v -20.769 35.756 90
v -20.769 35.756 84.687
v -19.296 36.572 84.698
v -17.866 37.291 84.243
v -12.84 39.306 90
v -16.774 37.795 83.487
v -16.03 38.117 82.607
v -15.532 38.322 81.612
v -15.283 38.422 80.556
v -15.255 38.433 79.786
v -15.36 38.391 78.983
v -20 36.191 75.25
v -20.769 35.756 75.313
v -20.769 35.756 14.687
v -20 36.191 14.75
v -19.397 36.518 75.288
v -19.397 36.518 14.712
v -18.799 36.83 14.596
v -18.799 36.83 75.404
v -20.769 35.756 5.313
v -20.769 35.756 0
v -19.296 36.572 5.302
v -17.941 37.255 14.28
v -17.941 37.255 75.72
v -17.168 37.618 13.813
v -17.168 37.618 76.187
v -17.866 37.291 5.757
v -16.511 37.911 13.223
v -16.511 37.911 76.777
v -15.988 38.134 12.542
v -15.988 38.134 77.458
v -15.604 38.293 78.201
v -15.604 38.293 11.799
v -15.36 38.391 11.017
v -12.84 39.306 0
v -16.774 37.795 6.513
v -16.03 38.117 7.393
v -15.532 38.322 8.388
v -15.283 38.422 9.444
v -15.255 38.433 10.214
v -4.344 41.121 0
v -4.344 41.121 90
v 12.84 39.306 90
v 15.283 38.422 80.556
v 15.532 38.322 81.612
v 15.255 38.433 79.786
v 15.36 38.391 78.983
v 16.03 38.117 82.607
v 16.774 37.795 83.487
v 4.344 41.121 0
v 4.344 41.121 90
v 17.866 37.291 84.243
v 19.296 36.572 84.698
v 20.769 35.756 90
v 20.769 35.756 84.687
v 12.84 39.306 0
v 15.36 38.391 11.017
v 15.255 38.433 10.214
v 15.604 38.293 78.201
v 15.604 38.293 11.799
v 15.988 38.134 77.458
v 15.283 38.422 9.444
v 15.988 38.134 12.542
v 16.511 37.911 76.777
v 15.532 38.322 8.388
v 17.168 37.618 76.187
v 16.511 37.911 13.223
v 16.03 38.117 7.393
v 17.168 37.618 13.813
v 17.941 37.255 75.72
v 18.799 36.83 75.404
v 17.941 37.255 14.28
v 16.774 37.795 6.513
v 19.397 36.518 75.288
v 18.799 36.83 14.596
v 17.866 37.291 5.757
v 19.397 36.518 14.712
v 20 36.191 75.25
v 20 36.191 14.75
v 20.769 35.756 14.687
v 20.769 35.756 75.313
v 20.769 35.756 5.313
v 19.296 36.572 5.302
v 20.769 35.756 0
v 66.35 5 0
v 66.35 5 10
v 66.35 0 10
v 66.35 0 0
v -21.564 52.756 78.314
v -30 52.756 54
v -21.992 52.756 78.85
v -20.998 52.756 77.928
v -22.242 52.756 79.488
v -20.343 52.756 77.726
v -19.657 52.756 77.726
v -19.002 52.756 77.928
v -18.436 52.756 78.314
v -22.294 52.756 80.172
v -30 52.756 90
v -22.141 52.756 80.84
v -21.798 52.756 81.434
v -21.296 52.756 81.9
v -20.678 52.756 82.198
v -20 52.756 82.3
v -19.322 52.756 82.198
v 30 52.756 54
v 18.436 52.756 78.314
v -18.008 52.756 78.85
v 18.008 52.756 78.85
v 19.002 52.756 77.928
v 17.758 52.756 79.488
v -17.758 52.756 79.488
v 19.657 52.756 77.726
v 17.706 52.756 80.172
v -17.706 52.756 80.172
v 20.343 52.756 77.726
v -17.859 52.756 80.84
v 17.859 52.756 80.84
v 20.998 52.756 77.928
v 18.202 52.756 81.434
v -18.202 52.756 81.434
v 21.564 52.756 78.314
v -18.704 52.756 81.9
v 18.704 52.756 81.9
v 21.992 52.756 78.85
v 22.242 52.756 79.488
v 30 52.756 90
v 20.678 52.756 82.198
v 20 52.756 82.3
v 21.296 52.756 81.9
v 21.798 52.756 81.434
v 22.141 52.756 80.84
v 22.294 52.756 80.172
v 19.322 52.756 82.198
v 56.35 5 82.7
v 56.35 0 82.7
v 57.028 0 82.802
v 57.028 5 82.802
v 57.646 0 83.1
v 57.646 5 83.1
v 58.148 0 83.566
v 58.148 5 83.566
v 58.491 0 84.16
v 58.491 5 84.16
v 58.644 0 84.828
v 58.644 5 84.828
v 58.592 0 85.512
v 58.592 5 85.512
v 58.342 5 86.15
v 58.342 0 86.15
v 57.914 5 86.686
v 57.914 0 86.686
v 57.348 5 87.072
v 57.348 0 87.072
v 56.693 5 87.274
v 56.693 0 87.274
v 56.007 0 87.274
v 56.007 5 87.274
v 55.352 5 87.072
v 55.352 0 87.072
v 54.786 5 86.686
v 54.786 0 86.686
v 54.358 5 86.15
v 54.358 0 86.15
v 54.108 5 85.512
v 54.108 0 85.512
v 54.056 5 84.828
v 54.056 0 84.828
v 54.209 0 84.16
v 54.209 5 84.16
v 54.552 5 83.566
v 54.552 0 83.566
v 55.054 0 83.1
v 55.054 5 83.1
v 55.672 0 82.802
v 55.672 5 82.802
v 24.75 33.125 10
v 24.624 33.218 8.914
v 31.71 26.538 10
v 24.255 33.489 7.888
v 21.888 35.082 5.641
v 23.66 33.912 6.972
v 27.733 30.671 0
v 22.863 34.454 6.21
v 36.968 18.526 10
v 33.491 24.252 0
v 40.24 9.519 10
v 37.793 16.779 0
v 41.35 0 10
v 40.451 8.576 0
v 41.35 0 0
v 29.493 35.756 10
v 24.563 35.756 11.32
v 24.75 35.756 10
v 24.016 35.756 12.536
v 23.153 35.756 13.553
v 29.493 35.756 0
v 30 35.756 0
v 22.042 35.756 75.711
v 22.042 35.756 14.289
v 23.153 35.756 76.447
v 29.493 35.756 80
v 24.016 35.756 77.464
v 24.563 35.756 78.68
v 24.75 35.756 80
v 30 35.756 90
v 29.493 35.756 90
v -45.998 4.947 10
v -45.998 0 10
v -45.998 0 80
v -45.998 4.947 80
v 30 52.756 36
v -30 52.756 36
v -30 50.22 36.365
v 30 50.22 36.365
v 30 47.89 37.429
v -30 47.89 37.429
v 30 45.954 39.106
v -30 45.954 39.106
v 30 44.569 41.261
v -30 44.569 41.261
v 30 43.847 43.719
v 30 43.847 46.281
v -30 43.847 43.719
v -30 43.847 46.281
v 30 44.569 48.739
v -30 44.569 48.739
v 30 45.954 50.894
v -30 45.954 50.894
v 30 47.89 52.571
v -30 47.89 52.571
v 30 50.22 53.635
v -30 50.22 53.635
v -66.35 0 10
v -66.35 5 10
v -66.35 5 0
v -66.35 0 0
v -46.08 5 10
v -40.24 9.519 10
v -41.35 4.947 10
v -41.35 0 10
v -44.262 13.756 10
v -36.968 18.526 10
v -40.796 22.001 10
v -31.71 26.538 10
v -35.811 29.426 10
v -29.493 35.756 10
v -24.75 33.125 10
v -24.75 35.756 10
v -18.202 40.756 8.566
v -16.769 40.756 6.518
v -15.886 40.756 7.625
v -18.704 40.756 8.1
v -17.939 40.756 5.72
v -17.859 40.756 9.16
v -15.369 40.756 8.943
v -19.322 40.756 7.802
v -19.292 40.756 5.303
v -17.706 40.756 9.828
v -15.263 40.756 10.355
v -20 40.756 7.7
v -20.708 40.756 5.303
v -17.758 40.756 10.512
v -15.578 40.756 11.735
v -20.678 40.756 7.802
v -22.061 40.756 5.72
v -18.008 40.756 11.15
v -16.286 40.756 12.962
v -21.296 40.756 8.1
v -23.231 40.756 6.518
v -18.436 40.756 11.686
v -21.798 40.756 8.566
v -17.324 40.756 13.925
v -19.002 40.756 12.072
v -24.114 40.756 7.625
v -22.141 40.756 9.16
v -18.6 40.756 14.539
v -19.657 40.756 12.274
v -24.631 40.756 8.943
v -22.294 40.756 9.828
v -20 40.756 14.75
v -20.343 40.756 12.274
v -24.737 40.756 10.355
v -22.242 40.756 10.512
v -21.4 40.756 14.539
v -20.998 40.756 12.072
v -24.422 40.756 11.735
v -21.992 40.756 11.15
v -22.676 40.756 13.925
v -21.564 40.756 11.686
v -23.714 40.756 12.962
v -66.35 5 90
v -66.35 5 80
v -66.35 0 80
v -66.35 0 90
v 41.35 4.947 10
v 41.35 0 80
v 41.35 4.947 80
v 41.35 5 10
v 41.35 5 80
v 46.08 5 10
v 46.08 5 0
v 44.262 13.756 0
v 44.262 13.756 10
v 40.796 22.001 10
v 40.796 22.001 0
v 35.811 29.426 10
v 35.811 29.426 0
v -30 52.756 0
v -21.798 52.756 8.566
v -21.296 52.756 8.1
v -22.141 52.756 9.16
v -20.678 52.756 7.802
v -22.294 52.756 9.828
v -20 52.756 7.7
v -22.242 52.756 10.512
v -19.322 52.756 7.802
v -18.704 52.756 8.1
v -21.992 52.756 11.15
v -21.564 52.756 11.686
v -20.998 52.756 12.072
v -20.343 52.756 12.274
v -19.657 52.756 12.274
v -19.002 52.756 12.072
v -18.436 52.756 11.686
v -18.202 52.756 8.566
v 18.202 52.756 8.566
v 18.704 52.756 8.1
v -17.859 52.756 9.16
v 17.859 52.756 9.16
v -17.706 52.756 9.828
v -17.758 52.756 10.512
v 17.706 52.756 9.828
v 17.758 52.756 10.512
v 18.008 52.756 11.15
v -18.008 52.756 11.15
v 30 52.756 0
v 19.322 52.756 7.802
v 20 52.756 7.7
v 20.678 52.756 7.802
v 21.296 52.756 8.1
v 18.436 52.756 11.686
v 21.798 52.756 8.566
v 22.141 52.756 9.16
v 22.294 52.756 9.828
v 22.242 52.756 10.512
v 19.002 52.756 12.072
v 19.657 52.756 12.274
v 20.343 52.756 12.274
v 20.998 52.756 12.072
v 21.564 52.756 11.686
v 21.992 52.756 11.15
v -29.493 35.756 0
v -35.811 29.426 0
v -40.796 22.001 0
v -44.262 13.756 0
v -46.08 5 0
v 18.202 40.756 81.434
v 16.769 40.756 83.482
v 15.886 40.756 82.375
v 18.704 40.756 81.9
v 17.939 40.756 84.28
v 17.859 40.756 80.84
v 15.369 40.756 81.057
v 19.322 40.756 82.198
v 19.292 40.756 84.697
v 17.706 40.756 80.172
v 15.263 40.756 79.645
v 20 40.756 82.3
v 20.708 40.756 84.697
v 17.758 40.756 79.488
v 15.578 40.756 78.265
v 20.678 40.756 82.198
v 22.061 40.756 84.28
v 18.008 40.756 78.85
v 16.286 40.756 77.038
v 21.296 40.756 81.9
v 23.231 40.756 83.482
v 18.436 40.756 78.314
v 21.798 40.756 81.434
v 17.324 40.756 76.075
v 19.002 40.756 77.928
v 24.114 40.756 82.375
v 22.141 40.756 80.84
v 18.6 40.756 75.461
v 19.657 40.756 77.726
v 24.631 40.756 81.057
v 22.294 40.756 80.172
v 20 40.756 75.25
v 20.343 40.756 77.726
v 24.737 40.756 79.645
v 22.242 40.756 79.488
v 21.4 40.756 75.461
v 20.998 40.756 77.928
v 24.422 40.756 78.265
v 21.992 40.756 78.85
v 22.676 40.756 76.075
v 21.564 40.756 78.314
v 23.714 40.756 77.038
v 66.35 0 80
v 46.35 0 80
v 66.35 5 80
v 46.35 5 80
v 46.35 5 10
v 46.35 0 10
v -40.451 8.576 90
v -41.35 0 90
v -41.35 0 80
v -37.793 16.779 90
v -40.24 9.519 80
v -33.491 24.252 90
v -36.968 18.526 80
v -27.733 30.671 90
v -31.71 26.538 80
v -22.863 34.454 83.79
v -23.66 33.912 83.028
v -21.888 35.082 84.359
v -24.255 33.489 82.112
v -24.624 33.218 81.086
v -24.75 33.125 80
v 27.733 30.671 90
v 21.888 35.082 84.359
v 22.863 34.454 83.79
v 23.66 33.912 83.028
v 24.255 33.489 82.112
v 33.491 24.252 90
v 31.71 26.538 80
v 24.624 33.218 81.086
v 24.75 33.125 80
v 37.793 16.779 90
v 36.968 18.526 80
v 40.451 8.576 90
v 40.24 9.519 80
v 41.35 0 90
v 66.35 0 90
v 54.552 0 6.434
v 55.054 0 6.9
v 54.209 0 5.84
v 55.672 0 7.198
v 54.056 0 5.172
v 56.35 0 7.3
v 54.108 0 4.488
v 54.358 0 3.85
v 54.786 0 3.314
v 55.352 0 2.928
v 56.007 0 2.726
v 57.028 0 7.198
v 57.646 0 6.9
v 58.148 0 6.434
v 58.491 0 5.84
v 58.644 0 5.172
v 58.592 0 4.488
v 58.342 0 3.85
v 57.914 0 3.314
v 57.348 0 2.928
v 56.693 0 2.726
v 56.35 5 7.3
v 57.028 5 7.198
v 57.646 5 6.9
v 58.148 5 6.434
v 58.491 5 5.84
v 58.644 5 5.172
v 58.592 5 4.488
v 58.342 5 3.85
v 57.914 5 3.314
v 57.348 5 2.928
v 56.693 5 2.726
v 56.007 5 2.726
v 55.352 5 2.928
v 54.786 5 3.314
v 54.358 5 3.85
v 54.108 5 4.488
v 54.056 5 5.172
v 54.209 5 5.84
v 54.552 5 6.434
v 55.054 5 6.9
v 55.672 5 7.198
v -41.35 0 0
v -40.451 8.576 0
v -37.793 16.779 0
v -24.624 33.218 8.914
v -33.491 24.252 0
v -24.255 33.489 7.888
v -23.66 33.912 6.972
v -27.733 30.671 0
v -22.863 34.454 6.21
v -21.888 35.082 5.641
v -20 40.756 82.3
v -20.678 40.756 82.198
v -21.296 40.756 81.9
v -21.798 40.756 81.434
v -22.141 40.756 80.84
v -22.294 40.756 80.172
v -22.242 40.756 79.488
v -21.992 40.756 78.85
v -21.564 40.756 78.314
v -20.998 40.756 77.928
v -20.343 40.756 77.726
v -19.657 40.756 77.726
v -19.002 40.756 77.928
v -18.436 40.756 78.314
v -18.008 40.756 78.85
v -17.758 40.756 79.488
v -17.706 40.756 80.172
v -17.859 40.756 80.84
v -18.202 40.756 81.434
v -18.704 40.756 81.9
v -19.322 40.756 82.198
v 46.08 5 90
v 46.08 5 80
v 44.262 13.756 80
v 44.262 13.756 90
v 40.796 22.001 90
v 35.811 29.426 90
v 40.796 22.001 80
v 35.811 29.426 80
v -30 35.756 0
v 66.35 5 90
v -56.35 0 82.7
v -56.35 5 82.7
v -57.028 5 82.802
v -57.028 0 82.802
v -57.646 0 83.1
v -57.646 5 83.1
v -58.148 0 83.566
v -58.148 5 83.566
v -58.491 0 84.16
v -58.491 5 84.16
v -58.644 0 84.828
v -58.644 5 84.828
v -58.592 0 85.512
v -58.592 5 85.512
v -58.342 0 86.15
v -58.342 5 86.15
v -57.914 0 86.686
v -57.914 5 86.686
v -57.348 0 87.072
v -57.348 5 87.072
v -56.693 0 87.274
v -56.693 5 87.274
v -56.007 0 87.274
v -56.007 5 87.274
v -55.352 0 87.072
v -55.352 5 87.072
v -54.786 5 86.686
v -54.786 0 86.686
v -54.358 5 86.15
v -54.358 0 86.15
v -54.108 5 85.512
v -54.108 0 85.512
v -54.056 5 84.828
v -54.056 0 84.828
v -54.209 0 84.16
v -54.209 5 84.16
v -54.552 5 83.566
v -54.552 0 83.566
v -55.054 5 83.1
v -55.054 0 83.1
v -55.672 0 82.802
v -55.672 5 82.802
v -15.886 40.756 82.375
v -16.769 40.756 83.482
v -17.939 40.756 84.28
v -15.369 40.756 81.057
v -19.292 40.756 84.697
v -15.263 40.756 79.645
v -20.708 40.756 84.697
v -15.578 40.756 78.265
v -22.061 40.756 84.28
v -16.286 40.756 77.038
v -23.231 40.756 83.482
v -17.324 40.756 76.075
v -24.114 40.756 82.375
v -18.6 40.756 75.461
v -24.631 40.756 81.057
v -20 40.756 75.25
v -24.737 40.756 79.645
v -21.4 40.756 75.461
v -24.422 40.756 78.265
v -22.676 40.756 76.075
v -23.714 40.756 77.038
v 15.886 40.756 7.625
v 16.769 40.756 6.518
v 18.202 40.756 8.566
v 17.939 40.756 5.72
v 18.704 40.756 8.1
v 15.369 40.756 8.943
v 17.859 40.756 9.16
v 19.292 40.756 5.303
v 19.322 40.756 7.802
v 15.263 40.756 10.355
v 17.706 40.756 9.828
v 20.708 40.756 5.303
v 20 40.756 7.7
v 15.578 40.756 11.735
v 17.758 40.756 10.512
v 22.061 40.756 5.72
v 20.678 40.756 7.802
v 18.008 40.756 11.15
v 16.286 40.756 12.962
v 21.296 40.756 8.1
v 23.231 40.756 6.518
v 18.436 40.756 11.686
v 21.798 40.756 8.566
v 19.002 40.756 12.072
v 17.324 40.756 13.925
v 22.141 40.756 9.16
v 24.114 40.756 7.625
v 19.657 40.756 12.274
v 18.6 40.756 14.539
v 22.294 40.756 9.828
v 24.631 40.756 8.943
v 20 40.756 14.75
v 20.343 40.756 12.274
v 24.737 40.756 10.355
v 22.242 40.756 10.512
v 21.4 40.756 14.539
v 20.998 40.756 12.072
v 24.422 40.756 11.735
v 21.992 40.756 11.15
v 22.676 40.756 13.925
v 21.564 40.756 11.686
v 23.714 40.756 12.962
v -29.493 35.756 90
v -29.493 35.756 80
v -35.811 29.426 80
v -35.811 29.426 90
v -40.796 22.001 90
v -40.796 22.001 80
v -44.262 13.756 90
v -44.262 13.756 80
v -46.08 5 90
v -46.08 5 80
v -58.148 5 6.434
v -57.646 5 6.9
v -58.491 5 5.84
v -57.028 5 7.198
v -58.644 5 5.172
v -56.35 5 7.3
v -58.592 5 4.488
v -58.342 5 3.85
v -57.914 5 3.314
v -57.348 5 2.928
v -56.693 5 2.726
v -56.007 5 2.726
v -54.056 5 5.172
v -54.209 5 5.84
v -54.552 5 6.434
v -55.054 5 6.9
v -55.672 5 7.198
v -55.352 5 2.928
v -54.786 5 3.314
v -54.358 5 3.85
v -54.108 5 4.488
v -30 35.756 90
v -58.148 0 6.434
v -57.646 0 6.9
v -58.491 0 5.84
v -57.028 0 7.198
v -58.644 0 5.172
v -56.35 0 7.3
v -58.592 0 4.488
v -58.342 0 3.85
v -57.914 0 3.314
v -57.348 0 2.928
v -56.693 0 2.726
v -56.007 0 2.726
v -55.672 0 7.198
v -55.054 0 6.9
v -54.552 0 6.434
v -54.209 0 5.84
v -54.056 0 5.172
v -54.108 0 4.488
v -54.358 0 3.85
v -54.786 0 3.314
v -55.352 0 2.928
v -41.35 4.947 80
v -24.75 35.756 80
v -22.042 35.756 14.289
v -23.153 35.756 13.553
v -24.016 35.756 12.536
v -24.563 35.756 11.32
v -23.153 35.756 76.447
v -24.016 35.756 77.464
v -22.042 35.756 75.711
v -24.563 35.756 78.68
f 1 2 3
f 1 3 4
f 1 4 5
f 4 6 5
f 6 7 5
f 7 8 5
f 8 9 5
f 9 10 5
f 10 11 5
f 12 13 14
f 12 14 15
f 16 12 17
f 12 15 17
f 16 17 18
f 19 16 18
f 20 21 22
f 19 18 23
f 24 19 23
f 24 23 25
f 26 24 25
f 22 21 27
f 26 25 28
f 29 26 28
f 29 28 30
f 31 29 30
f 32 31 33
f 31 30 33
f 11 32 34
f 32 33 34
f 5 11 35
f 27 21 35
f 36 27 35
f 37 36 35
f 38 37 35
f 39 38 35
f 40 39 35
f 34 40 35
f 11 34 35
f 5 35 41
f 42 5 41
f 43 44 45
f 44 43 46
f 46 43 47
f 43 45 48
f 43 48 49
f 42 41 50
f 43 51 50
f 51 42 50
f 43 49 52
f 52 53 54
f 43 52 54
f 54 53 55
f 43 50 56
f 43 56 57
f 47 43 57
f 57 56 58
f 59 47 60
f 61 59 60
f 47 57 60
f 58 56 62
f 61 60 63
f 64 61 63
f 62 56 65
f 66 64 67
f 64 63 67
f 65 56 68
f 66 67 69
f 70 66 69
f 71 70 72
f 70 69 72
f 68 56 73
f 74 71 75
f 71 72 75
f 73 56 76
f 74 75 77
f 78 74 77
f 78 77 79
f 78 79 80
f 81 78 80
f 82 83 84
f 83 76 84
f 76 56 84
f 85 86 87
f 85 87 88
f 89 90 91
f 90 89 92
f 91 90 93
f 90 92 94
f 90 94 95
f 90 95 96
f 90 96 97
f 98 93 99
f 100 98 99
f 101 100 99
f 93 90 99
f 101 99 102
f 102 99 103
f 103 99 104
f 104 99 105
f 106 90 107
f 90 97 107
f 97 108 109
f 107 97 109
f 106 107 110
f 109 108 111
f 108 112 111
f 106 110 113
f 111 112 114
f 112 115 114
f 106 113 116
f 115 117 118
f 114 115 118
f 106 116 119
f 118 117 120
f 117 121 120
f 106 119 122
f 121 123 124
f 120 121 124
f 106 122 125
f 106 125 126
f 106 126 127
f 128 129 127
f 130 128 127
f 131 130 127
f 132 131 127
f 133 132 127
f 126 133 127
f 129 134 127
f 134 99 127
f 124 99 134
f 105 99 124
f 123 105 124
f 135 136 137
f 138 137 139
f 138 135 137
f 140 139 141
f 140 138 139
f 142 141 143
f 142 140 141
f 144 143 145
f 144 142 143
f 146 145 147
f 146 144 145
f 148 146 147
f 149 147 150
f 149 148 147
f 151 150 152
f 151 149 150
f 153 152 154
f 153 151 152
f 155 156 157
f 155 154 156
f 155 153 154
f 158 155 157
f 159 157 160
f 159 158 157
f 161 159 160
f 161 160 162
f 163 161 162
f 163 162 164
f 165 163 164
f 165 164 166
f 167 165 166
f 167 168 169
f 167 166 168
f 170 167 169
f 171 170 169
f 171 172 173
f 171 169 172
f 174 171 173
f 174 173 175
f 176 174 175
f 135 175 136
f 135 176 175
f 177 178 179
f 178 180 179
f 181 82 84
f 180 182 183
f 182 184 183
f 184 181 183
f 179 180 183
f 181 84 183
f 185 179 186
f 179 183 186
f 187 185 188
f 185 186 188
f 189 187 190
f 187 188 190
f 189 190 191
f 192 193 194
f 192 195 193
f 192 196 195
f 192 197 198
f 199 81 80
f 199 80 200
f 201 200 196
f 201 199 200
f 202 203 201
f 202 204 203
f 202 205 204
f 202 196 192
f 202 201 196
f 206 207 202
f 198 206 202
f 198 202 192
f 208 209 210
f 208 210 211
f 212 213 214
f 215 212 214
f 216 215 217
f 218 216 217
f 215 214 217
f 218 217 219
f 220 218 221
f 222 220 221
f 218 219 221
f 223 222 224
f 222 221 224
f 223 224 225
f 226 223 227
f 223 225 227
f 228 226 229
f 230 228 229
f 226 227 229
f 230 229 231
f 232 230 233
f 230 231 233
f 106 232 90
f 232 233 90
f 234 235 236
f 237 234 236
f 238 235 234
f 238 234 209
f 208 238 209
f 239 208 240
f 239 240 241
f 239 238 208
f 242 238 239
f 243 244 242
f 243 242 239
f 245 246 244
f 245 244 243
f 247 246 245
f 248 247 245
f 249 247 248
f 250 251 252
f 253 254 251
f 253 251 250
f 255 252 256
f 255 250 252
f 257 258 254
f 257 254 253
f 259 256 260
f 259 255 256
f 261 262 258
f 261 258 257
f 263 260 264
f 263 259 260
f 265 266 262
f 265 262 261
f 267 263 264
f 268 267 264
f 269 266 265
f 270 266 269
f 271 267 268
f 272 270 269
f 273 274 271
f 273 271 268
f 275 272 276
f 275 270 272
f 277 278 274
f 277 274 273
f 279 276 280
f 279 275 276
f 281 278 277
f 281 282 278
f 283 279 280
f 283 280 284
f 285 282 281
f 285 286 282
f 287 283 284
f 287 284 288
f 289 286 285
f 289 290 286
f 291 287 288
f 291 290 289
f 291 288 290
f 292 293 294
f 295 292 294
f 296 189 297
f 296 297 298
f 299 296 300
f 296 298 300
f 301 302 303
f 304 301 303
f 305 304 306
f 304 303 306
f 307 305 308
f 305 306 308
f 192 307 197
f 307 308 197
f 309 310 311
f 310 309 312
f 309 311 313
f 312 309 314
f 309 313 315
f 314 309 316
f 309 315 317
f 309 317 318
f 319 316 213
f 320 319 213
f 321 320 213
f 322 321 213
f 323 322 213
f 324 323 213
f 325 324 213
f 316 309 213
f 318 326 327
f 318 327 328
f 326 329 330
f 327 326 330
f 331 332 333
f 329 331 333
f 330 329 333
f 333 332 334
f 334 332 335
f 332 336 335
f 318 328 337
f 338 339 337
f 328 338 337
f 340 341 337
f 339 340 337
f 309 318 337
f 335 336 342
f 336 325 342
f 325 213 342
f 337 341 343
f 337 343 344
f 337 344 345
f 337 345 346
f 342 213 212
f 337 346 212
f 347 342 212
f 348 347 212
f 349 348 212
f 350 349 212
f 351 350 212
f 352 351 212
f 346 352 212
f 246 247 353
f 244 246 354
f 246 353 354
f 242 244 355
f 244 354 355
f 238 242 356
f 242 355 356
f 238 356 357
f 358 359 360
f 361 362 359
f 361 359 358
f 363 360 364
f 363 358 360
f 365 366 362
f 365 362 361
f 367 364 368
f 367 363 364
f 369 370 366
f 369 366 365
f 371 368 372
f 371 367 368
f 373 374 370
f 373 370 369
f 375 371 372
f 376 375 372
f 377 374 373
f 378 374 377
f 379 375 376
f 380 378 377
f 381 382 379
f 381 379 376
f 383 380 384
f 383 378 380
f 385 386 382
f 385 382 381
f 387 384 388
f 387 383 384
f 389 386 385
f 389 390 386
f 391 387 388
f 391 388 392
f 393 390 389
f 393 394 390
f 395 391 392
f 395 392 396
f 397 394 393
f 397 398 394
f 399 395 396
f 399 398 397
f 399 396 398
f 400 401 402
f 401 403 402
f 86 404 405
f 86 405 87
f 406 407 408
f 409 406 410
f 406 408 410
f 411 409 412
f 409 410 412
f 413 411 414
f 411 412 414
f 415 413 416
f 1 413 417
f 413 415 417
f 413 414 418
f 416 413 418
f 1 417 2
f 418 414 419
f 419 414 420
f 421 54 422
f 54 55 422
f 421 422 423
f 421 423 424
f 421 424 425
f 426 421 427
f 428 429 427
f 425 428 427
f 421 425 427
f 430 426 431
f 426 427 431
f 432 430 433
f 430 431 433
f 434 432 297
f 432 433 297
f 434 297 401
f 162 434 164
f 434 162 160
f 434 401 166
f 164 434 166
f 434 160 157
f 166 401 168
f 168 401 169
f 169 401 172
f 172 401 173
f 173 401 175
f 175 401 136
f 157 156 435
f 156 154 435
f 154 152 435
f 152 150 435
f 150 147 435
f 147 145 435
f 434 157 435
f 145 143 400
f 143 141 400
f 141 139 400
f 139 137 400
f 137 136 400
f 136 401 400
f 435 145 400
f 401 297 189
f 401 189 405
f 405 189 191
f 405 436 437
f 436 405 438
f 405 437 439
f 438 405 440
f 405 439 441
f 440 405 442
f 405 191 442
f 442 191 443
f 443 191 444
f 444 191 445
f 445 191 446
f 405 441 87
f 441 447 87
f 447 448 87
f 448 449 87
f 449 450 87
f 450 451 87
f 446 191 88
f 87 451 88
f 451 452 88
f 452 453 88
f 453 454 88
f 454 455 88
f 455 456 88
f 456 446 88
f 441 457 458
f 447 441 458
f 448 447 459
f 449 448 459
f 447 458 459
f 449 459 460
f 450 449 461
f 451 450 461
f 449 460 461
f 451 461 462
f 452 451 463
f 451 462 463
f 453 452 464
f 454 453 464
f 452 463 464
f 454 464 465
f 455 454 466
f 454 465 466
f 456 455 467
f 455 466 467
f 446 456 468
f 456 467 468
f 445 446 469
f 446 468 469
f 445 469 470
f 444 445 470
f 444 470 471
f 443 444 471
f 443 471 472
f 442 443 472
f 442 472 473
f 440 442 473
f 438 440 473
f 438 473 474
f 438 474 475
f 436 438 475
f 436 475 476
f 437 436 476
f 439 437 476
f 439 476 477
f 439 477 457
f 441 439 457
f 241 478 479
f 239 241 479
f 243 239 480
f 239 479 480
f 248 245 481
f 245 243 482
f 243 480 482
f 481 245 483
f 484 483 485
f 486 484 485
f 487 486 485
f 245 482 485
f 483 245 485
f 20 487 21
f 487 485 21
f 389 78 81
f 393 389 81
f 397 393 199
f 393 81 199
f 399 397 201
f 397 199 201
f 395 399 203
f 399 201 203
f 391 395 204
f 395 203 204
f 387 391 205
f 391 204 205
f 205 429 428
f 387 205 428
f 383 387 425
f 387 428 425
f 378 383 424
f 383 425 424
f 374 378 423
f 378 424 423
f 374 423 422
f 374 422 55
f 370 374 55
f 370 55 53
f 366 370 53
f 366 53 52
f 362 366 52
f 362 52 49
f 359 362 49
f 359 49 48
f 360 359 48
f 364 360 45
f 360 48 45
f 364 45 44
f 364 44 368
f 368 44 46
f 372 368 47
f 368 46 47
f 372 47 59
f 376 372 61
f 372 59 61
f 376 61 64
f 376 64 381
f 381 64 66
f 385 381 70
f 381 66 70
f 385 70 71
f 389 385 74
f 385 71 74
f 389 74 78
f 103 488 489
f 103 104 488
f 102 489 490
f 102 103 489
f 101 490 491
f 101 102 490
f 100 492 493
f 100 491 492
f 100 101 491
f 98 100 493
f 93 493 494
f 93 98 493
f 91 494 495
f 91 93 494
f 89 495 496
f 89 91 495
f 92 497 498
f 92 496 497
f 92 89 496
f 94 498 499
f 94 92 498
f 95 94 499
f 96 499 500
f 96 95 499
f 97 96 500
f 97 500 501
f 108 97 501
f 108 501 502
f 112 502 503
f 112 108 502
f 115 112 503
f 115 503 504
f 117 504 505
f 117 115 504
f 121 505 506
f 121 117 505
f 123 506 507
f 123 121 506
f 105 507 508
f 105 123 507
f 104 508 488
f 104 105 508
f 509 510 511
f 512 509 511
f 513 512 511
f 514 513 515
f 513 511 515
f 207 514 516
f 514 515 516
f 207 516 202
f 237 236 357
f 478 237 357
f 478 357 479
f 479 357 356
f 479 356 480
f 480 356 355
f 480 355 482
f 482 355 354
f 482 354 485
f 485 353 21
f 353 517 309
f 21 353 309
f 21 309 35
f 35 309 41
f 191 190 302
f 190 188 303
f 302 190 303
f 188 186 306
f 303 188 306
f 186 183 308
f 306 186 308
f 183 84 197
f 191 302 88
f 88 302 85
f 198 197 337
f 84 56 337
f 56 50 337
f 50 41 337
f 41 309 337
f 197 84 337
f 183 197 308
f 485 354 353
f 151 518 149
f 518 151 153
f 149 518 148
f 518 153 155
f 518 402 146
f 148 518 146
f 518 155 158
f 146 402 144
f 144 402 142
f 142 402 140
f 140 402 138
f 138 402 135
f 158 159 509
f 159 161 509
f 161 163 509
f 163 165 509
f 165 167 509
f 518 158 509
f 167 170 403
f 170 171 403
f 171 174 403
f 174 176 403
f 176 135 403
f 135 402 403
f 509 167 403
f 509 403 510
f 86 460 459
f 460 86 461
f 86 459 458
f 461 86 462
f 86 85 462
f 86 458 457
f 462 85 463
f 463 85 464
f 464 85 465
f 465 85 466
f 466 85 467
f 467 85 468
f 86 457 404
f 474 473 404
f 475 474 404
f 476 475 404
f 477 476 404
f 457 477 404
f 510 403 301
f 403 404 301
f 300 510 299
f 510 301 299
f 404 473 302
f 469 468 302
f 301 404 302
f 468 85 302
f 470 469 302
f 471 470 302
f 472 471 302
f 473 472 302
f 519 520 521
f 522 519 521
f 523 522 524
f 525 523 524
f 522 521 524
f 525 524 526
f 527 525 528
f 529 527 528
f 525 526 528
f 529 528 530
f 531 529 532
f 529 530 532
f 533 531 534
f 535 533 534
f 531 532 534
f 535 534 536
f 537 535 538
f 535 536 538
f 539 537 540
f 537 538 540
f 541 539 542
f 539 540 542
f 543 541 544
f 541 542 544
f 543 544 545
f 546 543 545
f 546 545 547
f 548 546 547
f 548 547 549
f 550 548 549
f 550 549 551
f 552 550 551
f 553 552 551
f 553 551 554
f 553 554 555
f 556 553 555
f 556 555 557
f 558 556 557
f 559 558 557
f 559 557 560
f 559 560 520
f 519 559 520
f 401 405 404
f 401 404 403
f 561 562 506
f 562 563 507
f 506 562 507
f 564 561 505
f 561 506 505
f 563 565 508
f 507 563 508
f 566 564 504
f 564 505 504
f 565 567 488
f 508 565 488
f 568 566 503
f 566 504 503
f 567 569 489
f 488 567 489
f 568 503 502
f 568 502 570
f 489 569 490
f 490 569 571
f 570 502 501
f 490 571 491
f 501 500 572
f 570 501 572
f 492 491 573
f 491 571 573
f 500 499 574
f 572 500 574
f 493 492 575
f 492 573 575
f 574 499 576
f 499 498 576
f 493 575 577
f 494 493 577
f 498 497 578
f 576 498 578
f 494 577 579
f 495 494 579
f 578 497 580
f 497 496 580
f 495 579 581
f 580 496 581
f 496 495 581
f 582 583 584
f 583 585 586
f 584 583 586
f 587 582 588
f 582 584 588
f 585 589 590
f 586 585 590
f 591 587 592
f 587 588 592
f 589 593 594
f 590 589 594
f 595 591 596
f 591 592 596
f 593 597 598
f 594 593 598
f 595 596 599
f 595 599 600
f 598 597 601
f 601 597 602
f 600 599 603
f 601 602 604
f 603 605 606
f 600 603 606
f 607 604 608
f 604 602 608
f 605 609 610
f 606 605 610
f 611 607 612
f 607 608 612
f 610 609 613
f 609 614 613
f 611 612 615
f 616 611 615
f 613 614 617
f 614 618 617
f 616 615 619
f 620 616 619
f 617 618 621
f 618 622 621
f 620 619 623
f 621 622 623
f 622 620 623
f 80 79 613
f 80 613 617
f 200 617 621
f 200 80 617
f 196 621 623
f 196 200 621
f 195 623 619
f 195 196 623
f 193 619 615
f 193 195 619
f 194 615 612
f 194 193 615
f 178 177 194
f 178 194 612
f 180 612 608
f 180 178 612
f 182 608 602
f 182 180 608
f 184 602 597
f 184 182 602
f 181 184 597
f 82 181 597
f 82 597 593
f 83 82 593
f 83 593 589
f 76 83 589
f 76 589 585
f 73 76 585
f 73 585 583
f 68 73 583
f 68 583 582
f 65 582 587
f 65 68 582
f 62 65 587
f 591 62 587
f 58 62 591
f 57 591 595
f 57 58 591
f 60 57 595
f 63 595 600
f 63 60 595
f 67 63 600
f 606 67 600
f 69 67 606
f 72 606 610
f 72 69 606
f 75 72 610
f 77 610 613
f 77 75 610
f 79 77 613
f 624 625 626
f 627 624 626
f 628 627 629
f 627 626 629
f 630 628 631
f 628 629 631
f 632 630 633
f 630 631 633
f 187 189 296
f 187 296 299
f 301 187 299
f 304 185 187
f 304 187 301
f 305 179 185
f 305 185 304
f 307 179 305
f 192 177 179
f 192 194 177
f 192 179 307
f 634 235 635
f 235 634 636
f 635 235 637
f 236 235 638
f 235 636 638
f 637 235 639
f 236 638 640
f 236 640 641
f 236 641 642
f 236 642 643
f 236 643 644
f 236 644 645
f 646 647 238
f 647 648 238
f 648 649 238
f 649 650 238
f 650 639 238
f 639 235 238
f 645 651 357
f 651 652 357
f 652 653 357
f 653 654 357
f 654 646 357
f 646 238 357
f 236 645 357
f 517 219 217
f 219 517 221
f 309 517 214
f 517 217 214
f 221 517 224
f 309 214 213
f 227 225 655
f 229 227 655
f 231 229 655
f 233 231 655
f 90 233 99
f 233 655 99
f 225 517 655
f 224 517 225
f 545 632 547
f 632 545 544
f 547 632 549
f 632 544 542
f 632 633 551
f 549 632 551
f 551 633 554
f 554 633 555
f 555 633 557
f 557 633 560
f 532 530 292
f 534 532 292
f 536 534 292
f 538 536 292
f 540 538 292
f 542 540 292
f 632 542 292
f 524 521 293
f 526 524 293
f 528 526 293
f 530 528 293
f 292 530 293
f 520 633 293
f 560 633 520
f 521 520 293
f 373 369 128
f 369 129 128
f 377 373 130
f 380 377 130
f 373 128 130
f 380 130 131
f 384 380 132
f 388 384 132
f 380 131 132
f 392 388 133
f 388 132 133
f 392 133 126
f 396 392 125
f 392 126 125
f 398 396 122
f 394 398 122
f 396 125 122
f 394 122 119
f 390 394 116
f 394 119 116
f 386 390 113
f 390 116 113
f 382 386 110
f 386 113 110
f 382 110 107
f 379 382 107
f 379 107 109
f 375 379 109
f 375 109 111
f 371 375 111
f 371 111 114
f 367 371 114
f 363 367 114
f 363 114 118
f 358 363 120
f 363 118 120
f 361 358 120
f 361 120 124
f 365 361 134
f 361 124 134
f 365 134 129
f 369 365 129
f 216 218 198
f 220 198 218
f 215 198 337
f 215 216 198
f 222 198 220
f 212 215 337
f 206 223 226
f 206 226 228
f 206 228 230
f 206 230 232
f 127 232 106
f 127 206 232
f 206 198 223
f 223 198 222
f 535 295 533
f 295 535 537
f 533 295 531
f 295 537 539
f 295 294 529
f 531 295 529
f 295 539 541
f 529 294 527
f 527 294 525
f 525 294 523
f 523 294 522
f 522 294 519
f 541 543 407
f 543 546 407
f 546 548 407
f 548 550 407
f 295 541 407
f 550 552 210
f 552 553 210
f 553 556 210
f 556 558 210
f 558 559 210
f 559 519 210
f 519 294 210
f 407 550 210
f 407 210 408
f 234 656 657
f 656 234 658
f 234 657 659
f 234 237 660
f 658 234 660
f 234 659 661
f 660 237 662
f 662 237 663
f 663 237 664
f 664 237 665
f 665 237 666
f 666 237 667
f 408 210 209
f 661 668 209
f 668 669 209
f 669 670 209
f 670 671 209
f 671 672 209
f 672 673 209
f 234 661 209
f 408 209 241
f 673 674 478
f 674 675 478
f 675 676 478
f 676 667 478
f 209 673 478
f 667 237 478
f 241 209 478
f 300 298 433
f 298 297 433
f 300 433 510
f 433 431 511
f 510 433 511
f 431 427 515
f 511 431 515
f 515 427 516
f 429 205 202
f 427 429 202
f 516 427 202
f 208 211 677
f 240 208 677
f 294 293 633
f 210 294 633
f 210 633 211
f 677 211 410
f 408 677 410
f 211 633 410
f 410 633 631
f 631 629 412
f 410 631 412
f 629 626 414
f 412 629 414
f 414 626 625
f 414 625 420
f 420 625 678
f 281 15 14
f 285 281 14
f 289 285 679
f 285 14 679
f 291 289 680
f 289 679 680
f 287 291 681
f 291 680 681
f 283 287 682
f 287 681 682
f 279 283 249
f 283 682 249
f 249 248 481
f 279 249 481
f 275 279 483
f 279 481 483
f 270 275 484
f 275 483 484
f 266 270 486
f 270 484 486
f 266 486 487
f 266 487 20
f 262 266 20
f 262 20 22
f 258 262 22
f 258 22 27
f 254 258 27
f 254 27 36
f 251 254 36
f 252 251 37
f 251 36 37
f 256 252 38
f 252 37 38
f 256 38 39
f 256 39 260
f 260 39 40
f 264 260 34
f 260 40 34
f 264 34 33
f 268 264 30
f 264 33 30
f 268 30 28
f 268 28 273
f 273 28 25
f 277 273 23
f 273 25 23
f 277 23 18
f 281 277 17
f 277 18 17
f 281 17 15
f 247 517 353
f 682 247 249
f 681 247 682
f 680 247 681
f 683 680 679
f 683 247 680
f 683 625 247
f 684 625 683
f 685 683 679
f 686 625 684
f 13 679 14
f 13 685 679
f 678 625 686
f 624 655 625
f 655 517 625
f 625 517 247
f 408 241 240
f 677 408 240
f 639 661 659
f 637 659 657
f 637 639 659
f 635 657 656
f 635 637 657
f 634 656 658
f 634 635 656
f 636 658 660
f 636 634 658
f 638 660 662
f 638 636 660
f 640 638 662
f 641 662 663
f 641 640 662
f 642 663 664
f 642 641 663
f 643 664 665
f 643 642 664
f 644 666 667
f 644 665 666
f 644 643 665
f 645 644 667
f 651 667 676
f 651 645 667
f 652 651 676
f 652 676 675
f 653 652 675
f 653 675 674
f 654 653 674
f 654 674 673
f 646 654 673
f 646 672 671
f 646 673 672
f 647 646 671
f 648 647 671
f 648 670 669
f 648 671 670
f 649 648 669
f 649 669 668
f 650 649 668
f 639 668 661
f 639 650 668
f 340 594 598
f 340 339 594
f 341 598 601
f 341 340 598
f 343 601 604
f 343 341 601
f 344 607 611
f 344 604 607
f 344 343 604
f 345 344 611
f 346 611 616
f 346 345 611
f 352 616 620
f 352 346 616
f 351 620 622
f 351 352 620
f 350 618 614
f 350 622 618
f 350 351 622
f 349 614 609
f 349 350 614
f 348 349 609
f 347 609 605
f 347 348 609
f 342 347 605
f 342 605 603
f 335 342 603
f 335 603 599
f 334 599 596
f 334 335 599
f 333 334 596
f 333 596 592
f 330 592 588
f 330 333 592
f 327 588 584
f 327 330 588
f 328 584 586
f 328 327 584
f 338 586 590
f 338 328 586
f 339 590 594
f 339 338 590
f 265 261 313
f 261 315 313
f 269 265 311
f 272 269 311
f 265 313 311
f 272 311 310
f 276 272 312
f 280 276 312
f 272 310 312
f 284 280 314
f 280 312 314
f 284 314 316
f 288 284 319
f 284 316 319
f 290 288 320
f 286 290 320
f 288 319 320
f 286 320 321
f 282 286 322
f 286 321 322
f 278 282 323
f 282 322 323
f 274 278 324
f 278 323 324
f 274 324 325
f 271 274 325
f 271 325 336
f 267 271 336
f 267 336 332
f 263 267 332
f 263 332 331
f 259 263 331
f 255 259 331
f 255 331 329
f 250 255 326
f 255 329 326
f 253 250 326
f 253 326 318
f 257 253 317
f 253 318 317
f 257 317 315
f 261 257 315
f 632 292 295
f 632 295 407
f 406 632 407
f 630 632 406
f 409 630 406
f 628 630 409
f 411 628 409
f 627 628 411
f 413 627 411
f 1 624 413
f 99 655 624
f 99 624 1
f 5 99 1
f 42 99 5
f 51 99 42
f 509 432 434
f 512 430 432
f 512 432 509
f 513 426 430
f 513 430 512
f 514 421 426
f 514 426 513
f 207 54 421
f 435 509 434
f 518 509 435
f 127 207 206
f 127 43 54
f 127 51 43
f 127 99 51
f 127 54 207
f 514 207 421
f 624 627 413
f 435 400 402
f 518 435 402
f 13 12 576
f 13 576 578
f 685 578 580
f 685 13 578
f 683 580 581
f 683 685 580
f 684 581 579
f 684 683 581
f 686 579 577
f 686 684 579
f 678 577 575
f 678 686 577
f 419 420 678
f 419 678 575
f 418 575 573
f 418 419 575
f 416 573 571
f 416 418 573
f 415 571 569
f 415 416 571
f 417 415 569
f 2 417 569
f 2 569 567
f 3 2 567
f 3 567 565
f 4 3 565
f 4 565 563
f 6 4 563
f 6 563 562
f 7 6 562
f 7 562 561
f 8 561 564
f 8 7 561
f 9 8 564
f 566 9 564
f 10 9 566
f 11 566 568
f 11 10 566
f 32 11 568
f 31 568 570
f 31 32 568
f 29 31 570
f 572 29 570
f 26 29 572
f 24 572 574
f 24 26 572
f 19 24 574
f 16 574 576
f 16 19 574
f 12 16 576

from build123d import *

# Parameters (mm, degrees)
BOSS_EXTRUDE1_DEPTH      = 10
SKETCH2_W                = 10
SKETCH2_H                = 5
BOSS_EXTRUDE2_DEPTH      = 66.35
SKETCH3_R                = 2.3
CUT_EXTRUDE1_DEPTH       = 132.7
SKETCH4_R                = 41.35
CUT_EXTRUDE3_DEPTH       = 50
LPATTERN4_START          = 80
LPATTERN4_DEPTH          = 10
LPATTERN4_2_DEPTH        = 10
LPATTERN4_3_DEPTH        = 10
MIRROR5_COPY_1_SKETCH_R  = 2.3
MIRROR5_COPY_1_DEPTH     = 132.7
SKETCH8_W                = 4.648420871
SKETCH8_H                = 4.94728133
BOSS_EXTRUDE3_DEPTH      = 40
SKETCH11_W               = 60
SKETCH11_H               = 17
BOSS_EXTRUDE4_DEPTH      = 90
SKETCH12_R               = 41.35
CUT_EXTRUDE4_DEPTH       = 250
SKETCH14_R               = 2.3
CUT_EXTRUDE6_DEPTH       = 150
MIRROR8_COPY_1_SKETCH_R  = 2.3
MIRROR8_COPY_1_DEPTH     = 150
SKETCH15_R               = 9
CUT_EXTRUDE7_DEPTH       = 67
SKETCH16_W               = 5
SKETCH16_H               = 90
BOSS_EXTRUDE5_DEPTH      = 5
SKETCH18_R               = 4.75
CUT_EXTRUDE8_DEPTH       = 5
MIRROR10_COPY_1_SKETCH_R = 4.75
MIRROR10_COPY_1_DEPTH    = 5


# Read off the part's stored shape, not the designer's step: LPattern4
with BuildPart() as part:
    # Sketch1 → Boss-Extrude1 (new body)
    with BuildSketch(Plane.XY):
        with BuildLine():
            Line((-46.35, 0), (-41.35, 0))
            ThreePointArc((-41.35, 0), (0, 41.35), (41.35, 0))
            Line((41.35, 0), (46.35, 0))
            ThreePointArc((46.35, 0), (0, 46.35), (-46.35, 0))
        make_face()
    extrude(amount=BOSS_EXTRUDE1_DEPTH)



with BuildPart() as body_2:
    # Sketch2 → Boss-Extrude2 (new, symmetric)
    with BuildSketch(Plane(origin=(0, 0, 0), x_dir=(0, 0, -1), z_dir=(1, 0, 0))):
        with Locations((-5, 2.5)):
            Rectangle(SKETCH2_W, SKETCH2_H)
    extrude(amount=BOSS_EXTRUDE2_DEPTH, both=True)

    # Sketch3 → Cut-Extrude1 (cut)
    with BuildSketch(Plane(origin=(0, 5, 0), x_dir=(1, 0, 0), z_dir=(0, 1, 0))):
        with Locations(Location((56.35, -5, 0), (0, 0, 270))):
            Circle(SKETCH3_R)
    cut_extrude1 = extrude(amount=-CUT_EXTRUDE1_DEPTH, mode=Mode.SUBTRACT)

    # Mirror1: Cut-Extrude1 across plane
    add(cut_extrude1.mirror(Plane(origin=(0, 0, 0), x_dir=(0, 0, 1), z_dir=(1, 0, 0))), mode=Mode.SUBTRACT)

    # Sketch4 → Cut-Extrude3 (cut, symmetric)
    with BuildSketch(Plane.XY):
        Circle(SKETCH4_R)
    extrude(amount=CUT_EXTRUDE3_DEPTH, both=True, mode=Mode.SUBTRACT)


with BuildPart() as cut_extrude3_piece_1:
    # of the separate pieces the step leaves, piece 1, a body of its own (cut_extrude3_pieces)
    add(body_2.part.solids().sort_by_distance((-41.35, 0, 10))[0])


with BuildPart() as cut_extrude3_piece_2:
    # of the separate pieces the step leaves, piece 2, a body of its own (cut_extrude3_pieces)
    add(body_2.part.solids().sort_by_distance((66.35, 0, 10))[0])


with BuildPart() as body_4:
    # LPattern4 outline → LPattern4 (new body)
    with BuildSketch(Plane.XY.offset(LPATTERN4_START)):
        with BuildLine():
            Line((66.35, 0), (66.35, 5))
            Line((66.35, 5), (41.046589383, 5))
            ThreePointArc((41.046589383, 5), (41.274077646, 2.504598671), (41.35, 0))
            Line((41.35, 0), (66.35, 0))
        make_face()
    extrude(amount=LPATTERN4_DEPTH)

    # Mirror5: Cut-Extrude1 across plane
    add(cut_extrude1.mirror(Plane.XY.offset(45)), mode=Mode.SUBTRACT)


with BuildPart() as body_5:
    # LPattern4 2 outline → LPattern4 2 (new body)
    with BuildSketch(Plane.XY.offset(LPATTERN4_START)):
        with BuildLine():
            Line((-46.35, 0), (-41.35, 0))
            ThreePointArc((-41.35, 0), (0, 41.35), (41.35, 0))
            Line((41.35, 0), (46.35, 0))
            ThreePointArc((46.35, 0), (0, 46.35), (-46.35, 0))
        make_face()
    extrude(amount=LPATTERN4_2_DEPTH)


with BuildPart() as body_6:
    # LPattern4 3 outline → LPattern4 3 (new body)
    with BuildSketch(Plane.XY.offset(LPATTERN4_START)):
        with BuildLine():
            Line((-66.35, 0), (-41.35, 0))
            ThreePointArc((-41.35, 0), (-41.274077646, 2.504598671), (-41.046589383, 5))
            Line((-41.046589383, 5), (-66.35, 5))
            Line((-66.35, 5), (-66.35, 0))
        make_face()
    extrude(amount=LPATTERN4_3_DEPTH)

    # Mirror5 copy 1 sketch → Mirror5 copy 1 (cut)
    with BuildSketch(Plane(origin=(0, 5, 90), x_dir=(-1, 0, 0), z_dir=(0, 1, 0))):
        with Locations(Location((56.35, -5, 0), (0, 0, 270))):
            Circle(MIRROR5_COPY_1_SKETCH_R)
    extrude(amount=-MIRROR5_COPY_1_DEPTH, mode=Mode.SUBTRACT)


with BuildPart() as part_1:
    add(part.part)

    add(cut_extrude3_piece_1.part)  # Boss-Extrude3 merges Cut-Extrude3 piece 1

    add(body_5.part)  # Boss-Extrude3 merges body 5

    add(body_6.part)  # Boss-Extrude3 merges body 6
    # Sketch8 → Boss-Extrude3 (add, symmetric)
    with BuildSketch(Plane.XY.offset(45)):
        with Locations((-43.674210436, 2.473640665)):
            Rectangle(SKETCH8_W, SKETCH8_H)
    boss_extrude3 = extrude(amount=BOSS_EXTRUDE3_DEPTH, both=True)

    # Mirror6: Boss-Extrude3 across plane
    add(boss_extrude3.mirror(Plane(origin=(0, 0, 0), x_dir=(0, 0, 1), z_dir=(1, 0, 0))))

    # Sketch11 → Boss-Extrude4 (add)
    with BuildSketch(Plane.XY.offset(90)):
        with Locations((0, 44.255632839)):
            Rectangle(SKETCH11_W, SKETCH11_H)
    extrude(amount=-BOSS_EXTRUDE4_DEPTH)

    # Sketch12 → Cut-Extrude4 (cut, symmetric)
    with BuildSketch(Plane.XY.offset(90)):
        Circle(SKETCH12_R)
    extrude(amount=CUT_EXTRUDE4_DEPTH, both=True, mode=Mode.SUBTRACT)

    # Sketch14 → Cut-Extrude6 (cut, symmetric)
    with BuildSketch(Plane(origin=(0, 52.755632839, 0), x_dir=(1, 0, 0), z_dir=(0, 1, 0))):
        with Locations(Location((20, -80, 0), (0, 0, 270))):
            Circle(SKETCH14_R)
    cut_extrude6 = extrude(amount=CUT_EXTRUDE6_DEPTH, both=True, mode=Mode.SUBTRACT)

    # Mirror7: Cut-Extrude6 across plane
    add(cut_extrude6.mirror(Plane(origin=(0, 0, 0), x_dir=(0, 0, 1), z_dir=(1, 0, 0))), mode=Mode.SUBTRACT)

    # Mirror8: Cut-Extrude6 across plane
    add(cut_extrude6.mirror(Plane.XY.offset(45)), mode=Mode.SUBTRACT)

    # Mirror8 copy 1 sketch → Mirror8 copy 1 (cut, symmetric)
    with BuildSketch(Plane(origin=(0, 52.755632839, 90), x_dir=(-1, 0, 0), z_dir=(0, 1, 0))):
        with Locations(Location((20, -80, 0), (0, 0, 270))):
            Circle(MIRROR8_COPY_1_SKETCH_R)
    extrude(amount=MIRROR8_COPY_1_DEPTH, both=True, mode=Mode.SUBTRACT)

    # Sketch15 → Cut-Extrude7 (cut)
    with BuildSketch(Plane.ZY.offset(30)):
        with Locations((45, 52.755632839)):
            Circle(SKETCH15_R)
    extrude(amount=-CUT_EXTRUDE7_DEPTH, mode=Mode.SUBTRACT)


    add(cut_extrude3_piece_2.part)  # Boss-Extrude5 merges Cut-Extrude3 piece 2

    add(body_4.part)  # Boss-Extrude5 merges body 4
    # Sketch16 → Boss-Extrude5 (add)
    with BuildSketch(Plane.XZ):
        with Locations((43.85, 45)):
            Rectangle(SKETCH16_W, SKETCH16_H)
    extrude(amount=-BOSS_EXTRUDE5_DEPTH)

    # Sketch18 → Cut-Extrude8 (cut, symmetric)
    with BuildSketch(Plane.XZ.offset(-35.755632839)):
        with Locations(Location((20, 80, 0), (0, 0, 270))):
            Circle(SKETCH18_R)
    cut_extrude8 = extrude(amount=CUT_EXTRUDE8_DEPTH, both=True, mode=Mode.SUBTRACT)

    # Mirror9: Cut-Extrude8 across plane
    add(cut_extrude8.mirror(Plane.XY.offset(45)), mode=Mode.SUBTRACT)

    # Mirror10: Cut-Extrude8 across plane
    add(cut_extrude8.mirror(Plane(origin=(0, 0, 0), x_dir=(0, 0, 1), z_dir=(1, 0, 0))), mode=Mode.SUBTRACT)

    # Mirror10 copy 1 sketch → Mirror10 copy 1 (cut, symmetric)
    with BuildSketch(Plane(origin=(0, 35.755632839, 90), x_dir=(-1, 0, 0), z_dir=(0, -1, 0))):
        with Locations(Location((20, 80, 0), (0, 0, 270))):
            Circle(MIRROR10_COPY_1_SKETCH_R)
    extrude(amount=MIRROR10_COPY_1_DEPTH, both=True, mode=Mode.SUBTRACT)


solid = part_1.part
